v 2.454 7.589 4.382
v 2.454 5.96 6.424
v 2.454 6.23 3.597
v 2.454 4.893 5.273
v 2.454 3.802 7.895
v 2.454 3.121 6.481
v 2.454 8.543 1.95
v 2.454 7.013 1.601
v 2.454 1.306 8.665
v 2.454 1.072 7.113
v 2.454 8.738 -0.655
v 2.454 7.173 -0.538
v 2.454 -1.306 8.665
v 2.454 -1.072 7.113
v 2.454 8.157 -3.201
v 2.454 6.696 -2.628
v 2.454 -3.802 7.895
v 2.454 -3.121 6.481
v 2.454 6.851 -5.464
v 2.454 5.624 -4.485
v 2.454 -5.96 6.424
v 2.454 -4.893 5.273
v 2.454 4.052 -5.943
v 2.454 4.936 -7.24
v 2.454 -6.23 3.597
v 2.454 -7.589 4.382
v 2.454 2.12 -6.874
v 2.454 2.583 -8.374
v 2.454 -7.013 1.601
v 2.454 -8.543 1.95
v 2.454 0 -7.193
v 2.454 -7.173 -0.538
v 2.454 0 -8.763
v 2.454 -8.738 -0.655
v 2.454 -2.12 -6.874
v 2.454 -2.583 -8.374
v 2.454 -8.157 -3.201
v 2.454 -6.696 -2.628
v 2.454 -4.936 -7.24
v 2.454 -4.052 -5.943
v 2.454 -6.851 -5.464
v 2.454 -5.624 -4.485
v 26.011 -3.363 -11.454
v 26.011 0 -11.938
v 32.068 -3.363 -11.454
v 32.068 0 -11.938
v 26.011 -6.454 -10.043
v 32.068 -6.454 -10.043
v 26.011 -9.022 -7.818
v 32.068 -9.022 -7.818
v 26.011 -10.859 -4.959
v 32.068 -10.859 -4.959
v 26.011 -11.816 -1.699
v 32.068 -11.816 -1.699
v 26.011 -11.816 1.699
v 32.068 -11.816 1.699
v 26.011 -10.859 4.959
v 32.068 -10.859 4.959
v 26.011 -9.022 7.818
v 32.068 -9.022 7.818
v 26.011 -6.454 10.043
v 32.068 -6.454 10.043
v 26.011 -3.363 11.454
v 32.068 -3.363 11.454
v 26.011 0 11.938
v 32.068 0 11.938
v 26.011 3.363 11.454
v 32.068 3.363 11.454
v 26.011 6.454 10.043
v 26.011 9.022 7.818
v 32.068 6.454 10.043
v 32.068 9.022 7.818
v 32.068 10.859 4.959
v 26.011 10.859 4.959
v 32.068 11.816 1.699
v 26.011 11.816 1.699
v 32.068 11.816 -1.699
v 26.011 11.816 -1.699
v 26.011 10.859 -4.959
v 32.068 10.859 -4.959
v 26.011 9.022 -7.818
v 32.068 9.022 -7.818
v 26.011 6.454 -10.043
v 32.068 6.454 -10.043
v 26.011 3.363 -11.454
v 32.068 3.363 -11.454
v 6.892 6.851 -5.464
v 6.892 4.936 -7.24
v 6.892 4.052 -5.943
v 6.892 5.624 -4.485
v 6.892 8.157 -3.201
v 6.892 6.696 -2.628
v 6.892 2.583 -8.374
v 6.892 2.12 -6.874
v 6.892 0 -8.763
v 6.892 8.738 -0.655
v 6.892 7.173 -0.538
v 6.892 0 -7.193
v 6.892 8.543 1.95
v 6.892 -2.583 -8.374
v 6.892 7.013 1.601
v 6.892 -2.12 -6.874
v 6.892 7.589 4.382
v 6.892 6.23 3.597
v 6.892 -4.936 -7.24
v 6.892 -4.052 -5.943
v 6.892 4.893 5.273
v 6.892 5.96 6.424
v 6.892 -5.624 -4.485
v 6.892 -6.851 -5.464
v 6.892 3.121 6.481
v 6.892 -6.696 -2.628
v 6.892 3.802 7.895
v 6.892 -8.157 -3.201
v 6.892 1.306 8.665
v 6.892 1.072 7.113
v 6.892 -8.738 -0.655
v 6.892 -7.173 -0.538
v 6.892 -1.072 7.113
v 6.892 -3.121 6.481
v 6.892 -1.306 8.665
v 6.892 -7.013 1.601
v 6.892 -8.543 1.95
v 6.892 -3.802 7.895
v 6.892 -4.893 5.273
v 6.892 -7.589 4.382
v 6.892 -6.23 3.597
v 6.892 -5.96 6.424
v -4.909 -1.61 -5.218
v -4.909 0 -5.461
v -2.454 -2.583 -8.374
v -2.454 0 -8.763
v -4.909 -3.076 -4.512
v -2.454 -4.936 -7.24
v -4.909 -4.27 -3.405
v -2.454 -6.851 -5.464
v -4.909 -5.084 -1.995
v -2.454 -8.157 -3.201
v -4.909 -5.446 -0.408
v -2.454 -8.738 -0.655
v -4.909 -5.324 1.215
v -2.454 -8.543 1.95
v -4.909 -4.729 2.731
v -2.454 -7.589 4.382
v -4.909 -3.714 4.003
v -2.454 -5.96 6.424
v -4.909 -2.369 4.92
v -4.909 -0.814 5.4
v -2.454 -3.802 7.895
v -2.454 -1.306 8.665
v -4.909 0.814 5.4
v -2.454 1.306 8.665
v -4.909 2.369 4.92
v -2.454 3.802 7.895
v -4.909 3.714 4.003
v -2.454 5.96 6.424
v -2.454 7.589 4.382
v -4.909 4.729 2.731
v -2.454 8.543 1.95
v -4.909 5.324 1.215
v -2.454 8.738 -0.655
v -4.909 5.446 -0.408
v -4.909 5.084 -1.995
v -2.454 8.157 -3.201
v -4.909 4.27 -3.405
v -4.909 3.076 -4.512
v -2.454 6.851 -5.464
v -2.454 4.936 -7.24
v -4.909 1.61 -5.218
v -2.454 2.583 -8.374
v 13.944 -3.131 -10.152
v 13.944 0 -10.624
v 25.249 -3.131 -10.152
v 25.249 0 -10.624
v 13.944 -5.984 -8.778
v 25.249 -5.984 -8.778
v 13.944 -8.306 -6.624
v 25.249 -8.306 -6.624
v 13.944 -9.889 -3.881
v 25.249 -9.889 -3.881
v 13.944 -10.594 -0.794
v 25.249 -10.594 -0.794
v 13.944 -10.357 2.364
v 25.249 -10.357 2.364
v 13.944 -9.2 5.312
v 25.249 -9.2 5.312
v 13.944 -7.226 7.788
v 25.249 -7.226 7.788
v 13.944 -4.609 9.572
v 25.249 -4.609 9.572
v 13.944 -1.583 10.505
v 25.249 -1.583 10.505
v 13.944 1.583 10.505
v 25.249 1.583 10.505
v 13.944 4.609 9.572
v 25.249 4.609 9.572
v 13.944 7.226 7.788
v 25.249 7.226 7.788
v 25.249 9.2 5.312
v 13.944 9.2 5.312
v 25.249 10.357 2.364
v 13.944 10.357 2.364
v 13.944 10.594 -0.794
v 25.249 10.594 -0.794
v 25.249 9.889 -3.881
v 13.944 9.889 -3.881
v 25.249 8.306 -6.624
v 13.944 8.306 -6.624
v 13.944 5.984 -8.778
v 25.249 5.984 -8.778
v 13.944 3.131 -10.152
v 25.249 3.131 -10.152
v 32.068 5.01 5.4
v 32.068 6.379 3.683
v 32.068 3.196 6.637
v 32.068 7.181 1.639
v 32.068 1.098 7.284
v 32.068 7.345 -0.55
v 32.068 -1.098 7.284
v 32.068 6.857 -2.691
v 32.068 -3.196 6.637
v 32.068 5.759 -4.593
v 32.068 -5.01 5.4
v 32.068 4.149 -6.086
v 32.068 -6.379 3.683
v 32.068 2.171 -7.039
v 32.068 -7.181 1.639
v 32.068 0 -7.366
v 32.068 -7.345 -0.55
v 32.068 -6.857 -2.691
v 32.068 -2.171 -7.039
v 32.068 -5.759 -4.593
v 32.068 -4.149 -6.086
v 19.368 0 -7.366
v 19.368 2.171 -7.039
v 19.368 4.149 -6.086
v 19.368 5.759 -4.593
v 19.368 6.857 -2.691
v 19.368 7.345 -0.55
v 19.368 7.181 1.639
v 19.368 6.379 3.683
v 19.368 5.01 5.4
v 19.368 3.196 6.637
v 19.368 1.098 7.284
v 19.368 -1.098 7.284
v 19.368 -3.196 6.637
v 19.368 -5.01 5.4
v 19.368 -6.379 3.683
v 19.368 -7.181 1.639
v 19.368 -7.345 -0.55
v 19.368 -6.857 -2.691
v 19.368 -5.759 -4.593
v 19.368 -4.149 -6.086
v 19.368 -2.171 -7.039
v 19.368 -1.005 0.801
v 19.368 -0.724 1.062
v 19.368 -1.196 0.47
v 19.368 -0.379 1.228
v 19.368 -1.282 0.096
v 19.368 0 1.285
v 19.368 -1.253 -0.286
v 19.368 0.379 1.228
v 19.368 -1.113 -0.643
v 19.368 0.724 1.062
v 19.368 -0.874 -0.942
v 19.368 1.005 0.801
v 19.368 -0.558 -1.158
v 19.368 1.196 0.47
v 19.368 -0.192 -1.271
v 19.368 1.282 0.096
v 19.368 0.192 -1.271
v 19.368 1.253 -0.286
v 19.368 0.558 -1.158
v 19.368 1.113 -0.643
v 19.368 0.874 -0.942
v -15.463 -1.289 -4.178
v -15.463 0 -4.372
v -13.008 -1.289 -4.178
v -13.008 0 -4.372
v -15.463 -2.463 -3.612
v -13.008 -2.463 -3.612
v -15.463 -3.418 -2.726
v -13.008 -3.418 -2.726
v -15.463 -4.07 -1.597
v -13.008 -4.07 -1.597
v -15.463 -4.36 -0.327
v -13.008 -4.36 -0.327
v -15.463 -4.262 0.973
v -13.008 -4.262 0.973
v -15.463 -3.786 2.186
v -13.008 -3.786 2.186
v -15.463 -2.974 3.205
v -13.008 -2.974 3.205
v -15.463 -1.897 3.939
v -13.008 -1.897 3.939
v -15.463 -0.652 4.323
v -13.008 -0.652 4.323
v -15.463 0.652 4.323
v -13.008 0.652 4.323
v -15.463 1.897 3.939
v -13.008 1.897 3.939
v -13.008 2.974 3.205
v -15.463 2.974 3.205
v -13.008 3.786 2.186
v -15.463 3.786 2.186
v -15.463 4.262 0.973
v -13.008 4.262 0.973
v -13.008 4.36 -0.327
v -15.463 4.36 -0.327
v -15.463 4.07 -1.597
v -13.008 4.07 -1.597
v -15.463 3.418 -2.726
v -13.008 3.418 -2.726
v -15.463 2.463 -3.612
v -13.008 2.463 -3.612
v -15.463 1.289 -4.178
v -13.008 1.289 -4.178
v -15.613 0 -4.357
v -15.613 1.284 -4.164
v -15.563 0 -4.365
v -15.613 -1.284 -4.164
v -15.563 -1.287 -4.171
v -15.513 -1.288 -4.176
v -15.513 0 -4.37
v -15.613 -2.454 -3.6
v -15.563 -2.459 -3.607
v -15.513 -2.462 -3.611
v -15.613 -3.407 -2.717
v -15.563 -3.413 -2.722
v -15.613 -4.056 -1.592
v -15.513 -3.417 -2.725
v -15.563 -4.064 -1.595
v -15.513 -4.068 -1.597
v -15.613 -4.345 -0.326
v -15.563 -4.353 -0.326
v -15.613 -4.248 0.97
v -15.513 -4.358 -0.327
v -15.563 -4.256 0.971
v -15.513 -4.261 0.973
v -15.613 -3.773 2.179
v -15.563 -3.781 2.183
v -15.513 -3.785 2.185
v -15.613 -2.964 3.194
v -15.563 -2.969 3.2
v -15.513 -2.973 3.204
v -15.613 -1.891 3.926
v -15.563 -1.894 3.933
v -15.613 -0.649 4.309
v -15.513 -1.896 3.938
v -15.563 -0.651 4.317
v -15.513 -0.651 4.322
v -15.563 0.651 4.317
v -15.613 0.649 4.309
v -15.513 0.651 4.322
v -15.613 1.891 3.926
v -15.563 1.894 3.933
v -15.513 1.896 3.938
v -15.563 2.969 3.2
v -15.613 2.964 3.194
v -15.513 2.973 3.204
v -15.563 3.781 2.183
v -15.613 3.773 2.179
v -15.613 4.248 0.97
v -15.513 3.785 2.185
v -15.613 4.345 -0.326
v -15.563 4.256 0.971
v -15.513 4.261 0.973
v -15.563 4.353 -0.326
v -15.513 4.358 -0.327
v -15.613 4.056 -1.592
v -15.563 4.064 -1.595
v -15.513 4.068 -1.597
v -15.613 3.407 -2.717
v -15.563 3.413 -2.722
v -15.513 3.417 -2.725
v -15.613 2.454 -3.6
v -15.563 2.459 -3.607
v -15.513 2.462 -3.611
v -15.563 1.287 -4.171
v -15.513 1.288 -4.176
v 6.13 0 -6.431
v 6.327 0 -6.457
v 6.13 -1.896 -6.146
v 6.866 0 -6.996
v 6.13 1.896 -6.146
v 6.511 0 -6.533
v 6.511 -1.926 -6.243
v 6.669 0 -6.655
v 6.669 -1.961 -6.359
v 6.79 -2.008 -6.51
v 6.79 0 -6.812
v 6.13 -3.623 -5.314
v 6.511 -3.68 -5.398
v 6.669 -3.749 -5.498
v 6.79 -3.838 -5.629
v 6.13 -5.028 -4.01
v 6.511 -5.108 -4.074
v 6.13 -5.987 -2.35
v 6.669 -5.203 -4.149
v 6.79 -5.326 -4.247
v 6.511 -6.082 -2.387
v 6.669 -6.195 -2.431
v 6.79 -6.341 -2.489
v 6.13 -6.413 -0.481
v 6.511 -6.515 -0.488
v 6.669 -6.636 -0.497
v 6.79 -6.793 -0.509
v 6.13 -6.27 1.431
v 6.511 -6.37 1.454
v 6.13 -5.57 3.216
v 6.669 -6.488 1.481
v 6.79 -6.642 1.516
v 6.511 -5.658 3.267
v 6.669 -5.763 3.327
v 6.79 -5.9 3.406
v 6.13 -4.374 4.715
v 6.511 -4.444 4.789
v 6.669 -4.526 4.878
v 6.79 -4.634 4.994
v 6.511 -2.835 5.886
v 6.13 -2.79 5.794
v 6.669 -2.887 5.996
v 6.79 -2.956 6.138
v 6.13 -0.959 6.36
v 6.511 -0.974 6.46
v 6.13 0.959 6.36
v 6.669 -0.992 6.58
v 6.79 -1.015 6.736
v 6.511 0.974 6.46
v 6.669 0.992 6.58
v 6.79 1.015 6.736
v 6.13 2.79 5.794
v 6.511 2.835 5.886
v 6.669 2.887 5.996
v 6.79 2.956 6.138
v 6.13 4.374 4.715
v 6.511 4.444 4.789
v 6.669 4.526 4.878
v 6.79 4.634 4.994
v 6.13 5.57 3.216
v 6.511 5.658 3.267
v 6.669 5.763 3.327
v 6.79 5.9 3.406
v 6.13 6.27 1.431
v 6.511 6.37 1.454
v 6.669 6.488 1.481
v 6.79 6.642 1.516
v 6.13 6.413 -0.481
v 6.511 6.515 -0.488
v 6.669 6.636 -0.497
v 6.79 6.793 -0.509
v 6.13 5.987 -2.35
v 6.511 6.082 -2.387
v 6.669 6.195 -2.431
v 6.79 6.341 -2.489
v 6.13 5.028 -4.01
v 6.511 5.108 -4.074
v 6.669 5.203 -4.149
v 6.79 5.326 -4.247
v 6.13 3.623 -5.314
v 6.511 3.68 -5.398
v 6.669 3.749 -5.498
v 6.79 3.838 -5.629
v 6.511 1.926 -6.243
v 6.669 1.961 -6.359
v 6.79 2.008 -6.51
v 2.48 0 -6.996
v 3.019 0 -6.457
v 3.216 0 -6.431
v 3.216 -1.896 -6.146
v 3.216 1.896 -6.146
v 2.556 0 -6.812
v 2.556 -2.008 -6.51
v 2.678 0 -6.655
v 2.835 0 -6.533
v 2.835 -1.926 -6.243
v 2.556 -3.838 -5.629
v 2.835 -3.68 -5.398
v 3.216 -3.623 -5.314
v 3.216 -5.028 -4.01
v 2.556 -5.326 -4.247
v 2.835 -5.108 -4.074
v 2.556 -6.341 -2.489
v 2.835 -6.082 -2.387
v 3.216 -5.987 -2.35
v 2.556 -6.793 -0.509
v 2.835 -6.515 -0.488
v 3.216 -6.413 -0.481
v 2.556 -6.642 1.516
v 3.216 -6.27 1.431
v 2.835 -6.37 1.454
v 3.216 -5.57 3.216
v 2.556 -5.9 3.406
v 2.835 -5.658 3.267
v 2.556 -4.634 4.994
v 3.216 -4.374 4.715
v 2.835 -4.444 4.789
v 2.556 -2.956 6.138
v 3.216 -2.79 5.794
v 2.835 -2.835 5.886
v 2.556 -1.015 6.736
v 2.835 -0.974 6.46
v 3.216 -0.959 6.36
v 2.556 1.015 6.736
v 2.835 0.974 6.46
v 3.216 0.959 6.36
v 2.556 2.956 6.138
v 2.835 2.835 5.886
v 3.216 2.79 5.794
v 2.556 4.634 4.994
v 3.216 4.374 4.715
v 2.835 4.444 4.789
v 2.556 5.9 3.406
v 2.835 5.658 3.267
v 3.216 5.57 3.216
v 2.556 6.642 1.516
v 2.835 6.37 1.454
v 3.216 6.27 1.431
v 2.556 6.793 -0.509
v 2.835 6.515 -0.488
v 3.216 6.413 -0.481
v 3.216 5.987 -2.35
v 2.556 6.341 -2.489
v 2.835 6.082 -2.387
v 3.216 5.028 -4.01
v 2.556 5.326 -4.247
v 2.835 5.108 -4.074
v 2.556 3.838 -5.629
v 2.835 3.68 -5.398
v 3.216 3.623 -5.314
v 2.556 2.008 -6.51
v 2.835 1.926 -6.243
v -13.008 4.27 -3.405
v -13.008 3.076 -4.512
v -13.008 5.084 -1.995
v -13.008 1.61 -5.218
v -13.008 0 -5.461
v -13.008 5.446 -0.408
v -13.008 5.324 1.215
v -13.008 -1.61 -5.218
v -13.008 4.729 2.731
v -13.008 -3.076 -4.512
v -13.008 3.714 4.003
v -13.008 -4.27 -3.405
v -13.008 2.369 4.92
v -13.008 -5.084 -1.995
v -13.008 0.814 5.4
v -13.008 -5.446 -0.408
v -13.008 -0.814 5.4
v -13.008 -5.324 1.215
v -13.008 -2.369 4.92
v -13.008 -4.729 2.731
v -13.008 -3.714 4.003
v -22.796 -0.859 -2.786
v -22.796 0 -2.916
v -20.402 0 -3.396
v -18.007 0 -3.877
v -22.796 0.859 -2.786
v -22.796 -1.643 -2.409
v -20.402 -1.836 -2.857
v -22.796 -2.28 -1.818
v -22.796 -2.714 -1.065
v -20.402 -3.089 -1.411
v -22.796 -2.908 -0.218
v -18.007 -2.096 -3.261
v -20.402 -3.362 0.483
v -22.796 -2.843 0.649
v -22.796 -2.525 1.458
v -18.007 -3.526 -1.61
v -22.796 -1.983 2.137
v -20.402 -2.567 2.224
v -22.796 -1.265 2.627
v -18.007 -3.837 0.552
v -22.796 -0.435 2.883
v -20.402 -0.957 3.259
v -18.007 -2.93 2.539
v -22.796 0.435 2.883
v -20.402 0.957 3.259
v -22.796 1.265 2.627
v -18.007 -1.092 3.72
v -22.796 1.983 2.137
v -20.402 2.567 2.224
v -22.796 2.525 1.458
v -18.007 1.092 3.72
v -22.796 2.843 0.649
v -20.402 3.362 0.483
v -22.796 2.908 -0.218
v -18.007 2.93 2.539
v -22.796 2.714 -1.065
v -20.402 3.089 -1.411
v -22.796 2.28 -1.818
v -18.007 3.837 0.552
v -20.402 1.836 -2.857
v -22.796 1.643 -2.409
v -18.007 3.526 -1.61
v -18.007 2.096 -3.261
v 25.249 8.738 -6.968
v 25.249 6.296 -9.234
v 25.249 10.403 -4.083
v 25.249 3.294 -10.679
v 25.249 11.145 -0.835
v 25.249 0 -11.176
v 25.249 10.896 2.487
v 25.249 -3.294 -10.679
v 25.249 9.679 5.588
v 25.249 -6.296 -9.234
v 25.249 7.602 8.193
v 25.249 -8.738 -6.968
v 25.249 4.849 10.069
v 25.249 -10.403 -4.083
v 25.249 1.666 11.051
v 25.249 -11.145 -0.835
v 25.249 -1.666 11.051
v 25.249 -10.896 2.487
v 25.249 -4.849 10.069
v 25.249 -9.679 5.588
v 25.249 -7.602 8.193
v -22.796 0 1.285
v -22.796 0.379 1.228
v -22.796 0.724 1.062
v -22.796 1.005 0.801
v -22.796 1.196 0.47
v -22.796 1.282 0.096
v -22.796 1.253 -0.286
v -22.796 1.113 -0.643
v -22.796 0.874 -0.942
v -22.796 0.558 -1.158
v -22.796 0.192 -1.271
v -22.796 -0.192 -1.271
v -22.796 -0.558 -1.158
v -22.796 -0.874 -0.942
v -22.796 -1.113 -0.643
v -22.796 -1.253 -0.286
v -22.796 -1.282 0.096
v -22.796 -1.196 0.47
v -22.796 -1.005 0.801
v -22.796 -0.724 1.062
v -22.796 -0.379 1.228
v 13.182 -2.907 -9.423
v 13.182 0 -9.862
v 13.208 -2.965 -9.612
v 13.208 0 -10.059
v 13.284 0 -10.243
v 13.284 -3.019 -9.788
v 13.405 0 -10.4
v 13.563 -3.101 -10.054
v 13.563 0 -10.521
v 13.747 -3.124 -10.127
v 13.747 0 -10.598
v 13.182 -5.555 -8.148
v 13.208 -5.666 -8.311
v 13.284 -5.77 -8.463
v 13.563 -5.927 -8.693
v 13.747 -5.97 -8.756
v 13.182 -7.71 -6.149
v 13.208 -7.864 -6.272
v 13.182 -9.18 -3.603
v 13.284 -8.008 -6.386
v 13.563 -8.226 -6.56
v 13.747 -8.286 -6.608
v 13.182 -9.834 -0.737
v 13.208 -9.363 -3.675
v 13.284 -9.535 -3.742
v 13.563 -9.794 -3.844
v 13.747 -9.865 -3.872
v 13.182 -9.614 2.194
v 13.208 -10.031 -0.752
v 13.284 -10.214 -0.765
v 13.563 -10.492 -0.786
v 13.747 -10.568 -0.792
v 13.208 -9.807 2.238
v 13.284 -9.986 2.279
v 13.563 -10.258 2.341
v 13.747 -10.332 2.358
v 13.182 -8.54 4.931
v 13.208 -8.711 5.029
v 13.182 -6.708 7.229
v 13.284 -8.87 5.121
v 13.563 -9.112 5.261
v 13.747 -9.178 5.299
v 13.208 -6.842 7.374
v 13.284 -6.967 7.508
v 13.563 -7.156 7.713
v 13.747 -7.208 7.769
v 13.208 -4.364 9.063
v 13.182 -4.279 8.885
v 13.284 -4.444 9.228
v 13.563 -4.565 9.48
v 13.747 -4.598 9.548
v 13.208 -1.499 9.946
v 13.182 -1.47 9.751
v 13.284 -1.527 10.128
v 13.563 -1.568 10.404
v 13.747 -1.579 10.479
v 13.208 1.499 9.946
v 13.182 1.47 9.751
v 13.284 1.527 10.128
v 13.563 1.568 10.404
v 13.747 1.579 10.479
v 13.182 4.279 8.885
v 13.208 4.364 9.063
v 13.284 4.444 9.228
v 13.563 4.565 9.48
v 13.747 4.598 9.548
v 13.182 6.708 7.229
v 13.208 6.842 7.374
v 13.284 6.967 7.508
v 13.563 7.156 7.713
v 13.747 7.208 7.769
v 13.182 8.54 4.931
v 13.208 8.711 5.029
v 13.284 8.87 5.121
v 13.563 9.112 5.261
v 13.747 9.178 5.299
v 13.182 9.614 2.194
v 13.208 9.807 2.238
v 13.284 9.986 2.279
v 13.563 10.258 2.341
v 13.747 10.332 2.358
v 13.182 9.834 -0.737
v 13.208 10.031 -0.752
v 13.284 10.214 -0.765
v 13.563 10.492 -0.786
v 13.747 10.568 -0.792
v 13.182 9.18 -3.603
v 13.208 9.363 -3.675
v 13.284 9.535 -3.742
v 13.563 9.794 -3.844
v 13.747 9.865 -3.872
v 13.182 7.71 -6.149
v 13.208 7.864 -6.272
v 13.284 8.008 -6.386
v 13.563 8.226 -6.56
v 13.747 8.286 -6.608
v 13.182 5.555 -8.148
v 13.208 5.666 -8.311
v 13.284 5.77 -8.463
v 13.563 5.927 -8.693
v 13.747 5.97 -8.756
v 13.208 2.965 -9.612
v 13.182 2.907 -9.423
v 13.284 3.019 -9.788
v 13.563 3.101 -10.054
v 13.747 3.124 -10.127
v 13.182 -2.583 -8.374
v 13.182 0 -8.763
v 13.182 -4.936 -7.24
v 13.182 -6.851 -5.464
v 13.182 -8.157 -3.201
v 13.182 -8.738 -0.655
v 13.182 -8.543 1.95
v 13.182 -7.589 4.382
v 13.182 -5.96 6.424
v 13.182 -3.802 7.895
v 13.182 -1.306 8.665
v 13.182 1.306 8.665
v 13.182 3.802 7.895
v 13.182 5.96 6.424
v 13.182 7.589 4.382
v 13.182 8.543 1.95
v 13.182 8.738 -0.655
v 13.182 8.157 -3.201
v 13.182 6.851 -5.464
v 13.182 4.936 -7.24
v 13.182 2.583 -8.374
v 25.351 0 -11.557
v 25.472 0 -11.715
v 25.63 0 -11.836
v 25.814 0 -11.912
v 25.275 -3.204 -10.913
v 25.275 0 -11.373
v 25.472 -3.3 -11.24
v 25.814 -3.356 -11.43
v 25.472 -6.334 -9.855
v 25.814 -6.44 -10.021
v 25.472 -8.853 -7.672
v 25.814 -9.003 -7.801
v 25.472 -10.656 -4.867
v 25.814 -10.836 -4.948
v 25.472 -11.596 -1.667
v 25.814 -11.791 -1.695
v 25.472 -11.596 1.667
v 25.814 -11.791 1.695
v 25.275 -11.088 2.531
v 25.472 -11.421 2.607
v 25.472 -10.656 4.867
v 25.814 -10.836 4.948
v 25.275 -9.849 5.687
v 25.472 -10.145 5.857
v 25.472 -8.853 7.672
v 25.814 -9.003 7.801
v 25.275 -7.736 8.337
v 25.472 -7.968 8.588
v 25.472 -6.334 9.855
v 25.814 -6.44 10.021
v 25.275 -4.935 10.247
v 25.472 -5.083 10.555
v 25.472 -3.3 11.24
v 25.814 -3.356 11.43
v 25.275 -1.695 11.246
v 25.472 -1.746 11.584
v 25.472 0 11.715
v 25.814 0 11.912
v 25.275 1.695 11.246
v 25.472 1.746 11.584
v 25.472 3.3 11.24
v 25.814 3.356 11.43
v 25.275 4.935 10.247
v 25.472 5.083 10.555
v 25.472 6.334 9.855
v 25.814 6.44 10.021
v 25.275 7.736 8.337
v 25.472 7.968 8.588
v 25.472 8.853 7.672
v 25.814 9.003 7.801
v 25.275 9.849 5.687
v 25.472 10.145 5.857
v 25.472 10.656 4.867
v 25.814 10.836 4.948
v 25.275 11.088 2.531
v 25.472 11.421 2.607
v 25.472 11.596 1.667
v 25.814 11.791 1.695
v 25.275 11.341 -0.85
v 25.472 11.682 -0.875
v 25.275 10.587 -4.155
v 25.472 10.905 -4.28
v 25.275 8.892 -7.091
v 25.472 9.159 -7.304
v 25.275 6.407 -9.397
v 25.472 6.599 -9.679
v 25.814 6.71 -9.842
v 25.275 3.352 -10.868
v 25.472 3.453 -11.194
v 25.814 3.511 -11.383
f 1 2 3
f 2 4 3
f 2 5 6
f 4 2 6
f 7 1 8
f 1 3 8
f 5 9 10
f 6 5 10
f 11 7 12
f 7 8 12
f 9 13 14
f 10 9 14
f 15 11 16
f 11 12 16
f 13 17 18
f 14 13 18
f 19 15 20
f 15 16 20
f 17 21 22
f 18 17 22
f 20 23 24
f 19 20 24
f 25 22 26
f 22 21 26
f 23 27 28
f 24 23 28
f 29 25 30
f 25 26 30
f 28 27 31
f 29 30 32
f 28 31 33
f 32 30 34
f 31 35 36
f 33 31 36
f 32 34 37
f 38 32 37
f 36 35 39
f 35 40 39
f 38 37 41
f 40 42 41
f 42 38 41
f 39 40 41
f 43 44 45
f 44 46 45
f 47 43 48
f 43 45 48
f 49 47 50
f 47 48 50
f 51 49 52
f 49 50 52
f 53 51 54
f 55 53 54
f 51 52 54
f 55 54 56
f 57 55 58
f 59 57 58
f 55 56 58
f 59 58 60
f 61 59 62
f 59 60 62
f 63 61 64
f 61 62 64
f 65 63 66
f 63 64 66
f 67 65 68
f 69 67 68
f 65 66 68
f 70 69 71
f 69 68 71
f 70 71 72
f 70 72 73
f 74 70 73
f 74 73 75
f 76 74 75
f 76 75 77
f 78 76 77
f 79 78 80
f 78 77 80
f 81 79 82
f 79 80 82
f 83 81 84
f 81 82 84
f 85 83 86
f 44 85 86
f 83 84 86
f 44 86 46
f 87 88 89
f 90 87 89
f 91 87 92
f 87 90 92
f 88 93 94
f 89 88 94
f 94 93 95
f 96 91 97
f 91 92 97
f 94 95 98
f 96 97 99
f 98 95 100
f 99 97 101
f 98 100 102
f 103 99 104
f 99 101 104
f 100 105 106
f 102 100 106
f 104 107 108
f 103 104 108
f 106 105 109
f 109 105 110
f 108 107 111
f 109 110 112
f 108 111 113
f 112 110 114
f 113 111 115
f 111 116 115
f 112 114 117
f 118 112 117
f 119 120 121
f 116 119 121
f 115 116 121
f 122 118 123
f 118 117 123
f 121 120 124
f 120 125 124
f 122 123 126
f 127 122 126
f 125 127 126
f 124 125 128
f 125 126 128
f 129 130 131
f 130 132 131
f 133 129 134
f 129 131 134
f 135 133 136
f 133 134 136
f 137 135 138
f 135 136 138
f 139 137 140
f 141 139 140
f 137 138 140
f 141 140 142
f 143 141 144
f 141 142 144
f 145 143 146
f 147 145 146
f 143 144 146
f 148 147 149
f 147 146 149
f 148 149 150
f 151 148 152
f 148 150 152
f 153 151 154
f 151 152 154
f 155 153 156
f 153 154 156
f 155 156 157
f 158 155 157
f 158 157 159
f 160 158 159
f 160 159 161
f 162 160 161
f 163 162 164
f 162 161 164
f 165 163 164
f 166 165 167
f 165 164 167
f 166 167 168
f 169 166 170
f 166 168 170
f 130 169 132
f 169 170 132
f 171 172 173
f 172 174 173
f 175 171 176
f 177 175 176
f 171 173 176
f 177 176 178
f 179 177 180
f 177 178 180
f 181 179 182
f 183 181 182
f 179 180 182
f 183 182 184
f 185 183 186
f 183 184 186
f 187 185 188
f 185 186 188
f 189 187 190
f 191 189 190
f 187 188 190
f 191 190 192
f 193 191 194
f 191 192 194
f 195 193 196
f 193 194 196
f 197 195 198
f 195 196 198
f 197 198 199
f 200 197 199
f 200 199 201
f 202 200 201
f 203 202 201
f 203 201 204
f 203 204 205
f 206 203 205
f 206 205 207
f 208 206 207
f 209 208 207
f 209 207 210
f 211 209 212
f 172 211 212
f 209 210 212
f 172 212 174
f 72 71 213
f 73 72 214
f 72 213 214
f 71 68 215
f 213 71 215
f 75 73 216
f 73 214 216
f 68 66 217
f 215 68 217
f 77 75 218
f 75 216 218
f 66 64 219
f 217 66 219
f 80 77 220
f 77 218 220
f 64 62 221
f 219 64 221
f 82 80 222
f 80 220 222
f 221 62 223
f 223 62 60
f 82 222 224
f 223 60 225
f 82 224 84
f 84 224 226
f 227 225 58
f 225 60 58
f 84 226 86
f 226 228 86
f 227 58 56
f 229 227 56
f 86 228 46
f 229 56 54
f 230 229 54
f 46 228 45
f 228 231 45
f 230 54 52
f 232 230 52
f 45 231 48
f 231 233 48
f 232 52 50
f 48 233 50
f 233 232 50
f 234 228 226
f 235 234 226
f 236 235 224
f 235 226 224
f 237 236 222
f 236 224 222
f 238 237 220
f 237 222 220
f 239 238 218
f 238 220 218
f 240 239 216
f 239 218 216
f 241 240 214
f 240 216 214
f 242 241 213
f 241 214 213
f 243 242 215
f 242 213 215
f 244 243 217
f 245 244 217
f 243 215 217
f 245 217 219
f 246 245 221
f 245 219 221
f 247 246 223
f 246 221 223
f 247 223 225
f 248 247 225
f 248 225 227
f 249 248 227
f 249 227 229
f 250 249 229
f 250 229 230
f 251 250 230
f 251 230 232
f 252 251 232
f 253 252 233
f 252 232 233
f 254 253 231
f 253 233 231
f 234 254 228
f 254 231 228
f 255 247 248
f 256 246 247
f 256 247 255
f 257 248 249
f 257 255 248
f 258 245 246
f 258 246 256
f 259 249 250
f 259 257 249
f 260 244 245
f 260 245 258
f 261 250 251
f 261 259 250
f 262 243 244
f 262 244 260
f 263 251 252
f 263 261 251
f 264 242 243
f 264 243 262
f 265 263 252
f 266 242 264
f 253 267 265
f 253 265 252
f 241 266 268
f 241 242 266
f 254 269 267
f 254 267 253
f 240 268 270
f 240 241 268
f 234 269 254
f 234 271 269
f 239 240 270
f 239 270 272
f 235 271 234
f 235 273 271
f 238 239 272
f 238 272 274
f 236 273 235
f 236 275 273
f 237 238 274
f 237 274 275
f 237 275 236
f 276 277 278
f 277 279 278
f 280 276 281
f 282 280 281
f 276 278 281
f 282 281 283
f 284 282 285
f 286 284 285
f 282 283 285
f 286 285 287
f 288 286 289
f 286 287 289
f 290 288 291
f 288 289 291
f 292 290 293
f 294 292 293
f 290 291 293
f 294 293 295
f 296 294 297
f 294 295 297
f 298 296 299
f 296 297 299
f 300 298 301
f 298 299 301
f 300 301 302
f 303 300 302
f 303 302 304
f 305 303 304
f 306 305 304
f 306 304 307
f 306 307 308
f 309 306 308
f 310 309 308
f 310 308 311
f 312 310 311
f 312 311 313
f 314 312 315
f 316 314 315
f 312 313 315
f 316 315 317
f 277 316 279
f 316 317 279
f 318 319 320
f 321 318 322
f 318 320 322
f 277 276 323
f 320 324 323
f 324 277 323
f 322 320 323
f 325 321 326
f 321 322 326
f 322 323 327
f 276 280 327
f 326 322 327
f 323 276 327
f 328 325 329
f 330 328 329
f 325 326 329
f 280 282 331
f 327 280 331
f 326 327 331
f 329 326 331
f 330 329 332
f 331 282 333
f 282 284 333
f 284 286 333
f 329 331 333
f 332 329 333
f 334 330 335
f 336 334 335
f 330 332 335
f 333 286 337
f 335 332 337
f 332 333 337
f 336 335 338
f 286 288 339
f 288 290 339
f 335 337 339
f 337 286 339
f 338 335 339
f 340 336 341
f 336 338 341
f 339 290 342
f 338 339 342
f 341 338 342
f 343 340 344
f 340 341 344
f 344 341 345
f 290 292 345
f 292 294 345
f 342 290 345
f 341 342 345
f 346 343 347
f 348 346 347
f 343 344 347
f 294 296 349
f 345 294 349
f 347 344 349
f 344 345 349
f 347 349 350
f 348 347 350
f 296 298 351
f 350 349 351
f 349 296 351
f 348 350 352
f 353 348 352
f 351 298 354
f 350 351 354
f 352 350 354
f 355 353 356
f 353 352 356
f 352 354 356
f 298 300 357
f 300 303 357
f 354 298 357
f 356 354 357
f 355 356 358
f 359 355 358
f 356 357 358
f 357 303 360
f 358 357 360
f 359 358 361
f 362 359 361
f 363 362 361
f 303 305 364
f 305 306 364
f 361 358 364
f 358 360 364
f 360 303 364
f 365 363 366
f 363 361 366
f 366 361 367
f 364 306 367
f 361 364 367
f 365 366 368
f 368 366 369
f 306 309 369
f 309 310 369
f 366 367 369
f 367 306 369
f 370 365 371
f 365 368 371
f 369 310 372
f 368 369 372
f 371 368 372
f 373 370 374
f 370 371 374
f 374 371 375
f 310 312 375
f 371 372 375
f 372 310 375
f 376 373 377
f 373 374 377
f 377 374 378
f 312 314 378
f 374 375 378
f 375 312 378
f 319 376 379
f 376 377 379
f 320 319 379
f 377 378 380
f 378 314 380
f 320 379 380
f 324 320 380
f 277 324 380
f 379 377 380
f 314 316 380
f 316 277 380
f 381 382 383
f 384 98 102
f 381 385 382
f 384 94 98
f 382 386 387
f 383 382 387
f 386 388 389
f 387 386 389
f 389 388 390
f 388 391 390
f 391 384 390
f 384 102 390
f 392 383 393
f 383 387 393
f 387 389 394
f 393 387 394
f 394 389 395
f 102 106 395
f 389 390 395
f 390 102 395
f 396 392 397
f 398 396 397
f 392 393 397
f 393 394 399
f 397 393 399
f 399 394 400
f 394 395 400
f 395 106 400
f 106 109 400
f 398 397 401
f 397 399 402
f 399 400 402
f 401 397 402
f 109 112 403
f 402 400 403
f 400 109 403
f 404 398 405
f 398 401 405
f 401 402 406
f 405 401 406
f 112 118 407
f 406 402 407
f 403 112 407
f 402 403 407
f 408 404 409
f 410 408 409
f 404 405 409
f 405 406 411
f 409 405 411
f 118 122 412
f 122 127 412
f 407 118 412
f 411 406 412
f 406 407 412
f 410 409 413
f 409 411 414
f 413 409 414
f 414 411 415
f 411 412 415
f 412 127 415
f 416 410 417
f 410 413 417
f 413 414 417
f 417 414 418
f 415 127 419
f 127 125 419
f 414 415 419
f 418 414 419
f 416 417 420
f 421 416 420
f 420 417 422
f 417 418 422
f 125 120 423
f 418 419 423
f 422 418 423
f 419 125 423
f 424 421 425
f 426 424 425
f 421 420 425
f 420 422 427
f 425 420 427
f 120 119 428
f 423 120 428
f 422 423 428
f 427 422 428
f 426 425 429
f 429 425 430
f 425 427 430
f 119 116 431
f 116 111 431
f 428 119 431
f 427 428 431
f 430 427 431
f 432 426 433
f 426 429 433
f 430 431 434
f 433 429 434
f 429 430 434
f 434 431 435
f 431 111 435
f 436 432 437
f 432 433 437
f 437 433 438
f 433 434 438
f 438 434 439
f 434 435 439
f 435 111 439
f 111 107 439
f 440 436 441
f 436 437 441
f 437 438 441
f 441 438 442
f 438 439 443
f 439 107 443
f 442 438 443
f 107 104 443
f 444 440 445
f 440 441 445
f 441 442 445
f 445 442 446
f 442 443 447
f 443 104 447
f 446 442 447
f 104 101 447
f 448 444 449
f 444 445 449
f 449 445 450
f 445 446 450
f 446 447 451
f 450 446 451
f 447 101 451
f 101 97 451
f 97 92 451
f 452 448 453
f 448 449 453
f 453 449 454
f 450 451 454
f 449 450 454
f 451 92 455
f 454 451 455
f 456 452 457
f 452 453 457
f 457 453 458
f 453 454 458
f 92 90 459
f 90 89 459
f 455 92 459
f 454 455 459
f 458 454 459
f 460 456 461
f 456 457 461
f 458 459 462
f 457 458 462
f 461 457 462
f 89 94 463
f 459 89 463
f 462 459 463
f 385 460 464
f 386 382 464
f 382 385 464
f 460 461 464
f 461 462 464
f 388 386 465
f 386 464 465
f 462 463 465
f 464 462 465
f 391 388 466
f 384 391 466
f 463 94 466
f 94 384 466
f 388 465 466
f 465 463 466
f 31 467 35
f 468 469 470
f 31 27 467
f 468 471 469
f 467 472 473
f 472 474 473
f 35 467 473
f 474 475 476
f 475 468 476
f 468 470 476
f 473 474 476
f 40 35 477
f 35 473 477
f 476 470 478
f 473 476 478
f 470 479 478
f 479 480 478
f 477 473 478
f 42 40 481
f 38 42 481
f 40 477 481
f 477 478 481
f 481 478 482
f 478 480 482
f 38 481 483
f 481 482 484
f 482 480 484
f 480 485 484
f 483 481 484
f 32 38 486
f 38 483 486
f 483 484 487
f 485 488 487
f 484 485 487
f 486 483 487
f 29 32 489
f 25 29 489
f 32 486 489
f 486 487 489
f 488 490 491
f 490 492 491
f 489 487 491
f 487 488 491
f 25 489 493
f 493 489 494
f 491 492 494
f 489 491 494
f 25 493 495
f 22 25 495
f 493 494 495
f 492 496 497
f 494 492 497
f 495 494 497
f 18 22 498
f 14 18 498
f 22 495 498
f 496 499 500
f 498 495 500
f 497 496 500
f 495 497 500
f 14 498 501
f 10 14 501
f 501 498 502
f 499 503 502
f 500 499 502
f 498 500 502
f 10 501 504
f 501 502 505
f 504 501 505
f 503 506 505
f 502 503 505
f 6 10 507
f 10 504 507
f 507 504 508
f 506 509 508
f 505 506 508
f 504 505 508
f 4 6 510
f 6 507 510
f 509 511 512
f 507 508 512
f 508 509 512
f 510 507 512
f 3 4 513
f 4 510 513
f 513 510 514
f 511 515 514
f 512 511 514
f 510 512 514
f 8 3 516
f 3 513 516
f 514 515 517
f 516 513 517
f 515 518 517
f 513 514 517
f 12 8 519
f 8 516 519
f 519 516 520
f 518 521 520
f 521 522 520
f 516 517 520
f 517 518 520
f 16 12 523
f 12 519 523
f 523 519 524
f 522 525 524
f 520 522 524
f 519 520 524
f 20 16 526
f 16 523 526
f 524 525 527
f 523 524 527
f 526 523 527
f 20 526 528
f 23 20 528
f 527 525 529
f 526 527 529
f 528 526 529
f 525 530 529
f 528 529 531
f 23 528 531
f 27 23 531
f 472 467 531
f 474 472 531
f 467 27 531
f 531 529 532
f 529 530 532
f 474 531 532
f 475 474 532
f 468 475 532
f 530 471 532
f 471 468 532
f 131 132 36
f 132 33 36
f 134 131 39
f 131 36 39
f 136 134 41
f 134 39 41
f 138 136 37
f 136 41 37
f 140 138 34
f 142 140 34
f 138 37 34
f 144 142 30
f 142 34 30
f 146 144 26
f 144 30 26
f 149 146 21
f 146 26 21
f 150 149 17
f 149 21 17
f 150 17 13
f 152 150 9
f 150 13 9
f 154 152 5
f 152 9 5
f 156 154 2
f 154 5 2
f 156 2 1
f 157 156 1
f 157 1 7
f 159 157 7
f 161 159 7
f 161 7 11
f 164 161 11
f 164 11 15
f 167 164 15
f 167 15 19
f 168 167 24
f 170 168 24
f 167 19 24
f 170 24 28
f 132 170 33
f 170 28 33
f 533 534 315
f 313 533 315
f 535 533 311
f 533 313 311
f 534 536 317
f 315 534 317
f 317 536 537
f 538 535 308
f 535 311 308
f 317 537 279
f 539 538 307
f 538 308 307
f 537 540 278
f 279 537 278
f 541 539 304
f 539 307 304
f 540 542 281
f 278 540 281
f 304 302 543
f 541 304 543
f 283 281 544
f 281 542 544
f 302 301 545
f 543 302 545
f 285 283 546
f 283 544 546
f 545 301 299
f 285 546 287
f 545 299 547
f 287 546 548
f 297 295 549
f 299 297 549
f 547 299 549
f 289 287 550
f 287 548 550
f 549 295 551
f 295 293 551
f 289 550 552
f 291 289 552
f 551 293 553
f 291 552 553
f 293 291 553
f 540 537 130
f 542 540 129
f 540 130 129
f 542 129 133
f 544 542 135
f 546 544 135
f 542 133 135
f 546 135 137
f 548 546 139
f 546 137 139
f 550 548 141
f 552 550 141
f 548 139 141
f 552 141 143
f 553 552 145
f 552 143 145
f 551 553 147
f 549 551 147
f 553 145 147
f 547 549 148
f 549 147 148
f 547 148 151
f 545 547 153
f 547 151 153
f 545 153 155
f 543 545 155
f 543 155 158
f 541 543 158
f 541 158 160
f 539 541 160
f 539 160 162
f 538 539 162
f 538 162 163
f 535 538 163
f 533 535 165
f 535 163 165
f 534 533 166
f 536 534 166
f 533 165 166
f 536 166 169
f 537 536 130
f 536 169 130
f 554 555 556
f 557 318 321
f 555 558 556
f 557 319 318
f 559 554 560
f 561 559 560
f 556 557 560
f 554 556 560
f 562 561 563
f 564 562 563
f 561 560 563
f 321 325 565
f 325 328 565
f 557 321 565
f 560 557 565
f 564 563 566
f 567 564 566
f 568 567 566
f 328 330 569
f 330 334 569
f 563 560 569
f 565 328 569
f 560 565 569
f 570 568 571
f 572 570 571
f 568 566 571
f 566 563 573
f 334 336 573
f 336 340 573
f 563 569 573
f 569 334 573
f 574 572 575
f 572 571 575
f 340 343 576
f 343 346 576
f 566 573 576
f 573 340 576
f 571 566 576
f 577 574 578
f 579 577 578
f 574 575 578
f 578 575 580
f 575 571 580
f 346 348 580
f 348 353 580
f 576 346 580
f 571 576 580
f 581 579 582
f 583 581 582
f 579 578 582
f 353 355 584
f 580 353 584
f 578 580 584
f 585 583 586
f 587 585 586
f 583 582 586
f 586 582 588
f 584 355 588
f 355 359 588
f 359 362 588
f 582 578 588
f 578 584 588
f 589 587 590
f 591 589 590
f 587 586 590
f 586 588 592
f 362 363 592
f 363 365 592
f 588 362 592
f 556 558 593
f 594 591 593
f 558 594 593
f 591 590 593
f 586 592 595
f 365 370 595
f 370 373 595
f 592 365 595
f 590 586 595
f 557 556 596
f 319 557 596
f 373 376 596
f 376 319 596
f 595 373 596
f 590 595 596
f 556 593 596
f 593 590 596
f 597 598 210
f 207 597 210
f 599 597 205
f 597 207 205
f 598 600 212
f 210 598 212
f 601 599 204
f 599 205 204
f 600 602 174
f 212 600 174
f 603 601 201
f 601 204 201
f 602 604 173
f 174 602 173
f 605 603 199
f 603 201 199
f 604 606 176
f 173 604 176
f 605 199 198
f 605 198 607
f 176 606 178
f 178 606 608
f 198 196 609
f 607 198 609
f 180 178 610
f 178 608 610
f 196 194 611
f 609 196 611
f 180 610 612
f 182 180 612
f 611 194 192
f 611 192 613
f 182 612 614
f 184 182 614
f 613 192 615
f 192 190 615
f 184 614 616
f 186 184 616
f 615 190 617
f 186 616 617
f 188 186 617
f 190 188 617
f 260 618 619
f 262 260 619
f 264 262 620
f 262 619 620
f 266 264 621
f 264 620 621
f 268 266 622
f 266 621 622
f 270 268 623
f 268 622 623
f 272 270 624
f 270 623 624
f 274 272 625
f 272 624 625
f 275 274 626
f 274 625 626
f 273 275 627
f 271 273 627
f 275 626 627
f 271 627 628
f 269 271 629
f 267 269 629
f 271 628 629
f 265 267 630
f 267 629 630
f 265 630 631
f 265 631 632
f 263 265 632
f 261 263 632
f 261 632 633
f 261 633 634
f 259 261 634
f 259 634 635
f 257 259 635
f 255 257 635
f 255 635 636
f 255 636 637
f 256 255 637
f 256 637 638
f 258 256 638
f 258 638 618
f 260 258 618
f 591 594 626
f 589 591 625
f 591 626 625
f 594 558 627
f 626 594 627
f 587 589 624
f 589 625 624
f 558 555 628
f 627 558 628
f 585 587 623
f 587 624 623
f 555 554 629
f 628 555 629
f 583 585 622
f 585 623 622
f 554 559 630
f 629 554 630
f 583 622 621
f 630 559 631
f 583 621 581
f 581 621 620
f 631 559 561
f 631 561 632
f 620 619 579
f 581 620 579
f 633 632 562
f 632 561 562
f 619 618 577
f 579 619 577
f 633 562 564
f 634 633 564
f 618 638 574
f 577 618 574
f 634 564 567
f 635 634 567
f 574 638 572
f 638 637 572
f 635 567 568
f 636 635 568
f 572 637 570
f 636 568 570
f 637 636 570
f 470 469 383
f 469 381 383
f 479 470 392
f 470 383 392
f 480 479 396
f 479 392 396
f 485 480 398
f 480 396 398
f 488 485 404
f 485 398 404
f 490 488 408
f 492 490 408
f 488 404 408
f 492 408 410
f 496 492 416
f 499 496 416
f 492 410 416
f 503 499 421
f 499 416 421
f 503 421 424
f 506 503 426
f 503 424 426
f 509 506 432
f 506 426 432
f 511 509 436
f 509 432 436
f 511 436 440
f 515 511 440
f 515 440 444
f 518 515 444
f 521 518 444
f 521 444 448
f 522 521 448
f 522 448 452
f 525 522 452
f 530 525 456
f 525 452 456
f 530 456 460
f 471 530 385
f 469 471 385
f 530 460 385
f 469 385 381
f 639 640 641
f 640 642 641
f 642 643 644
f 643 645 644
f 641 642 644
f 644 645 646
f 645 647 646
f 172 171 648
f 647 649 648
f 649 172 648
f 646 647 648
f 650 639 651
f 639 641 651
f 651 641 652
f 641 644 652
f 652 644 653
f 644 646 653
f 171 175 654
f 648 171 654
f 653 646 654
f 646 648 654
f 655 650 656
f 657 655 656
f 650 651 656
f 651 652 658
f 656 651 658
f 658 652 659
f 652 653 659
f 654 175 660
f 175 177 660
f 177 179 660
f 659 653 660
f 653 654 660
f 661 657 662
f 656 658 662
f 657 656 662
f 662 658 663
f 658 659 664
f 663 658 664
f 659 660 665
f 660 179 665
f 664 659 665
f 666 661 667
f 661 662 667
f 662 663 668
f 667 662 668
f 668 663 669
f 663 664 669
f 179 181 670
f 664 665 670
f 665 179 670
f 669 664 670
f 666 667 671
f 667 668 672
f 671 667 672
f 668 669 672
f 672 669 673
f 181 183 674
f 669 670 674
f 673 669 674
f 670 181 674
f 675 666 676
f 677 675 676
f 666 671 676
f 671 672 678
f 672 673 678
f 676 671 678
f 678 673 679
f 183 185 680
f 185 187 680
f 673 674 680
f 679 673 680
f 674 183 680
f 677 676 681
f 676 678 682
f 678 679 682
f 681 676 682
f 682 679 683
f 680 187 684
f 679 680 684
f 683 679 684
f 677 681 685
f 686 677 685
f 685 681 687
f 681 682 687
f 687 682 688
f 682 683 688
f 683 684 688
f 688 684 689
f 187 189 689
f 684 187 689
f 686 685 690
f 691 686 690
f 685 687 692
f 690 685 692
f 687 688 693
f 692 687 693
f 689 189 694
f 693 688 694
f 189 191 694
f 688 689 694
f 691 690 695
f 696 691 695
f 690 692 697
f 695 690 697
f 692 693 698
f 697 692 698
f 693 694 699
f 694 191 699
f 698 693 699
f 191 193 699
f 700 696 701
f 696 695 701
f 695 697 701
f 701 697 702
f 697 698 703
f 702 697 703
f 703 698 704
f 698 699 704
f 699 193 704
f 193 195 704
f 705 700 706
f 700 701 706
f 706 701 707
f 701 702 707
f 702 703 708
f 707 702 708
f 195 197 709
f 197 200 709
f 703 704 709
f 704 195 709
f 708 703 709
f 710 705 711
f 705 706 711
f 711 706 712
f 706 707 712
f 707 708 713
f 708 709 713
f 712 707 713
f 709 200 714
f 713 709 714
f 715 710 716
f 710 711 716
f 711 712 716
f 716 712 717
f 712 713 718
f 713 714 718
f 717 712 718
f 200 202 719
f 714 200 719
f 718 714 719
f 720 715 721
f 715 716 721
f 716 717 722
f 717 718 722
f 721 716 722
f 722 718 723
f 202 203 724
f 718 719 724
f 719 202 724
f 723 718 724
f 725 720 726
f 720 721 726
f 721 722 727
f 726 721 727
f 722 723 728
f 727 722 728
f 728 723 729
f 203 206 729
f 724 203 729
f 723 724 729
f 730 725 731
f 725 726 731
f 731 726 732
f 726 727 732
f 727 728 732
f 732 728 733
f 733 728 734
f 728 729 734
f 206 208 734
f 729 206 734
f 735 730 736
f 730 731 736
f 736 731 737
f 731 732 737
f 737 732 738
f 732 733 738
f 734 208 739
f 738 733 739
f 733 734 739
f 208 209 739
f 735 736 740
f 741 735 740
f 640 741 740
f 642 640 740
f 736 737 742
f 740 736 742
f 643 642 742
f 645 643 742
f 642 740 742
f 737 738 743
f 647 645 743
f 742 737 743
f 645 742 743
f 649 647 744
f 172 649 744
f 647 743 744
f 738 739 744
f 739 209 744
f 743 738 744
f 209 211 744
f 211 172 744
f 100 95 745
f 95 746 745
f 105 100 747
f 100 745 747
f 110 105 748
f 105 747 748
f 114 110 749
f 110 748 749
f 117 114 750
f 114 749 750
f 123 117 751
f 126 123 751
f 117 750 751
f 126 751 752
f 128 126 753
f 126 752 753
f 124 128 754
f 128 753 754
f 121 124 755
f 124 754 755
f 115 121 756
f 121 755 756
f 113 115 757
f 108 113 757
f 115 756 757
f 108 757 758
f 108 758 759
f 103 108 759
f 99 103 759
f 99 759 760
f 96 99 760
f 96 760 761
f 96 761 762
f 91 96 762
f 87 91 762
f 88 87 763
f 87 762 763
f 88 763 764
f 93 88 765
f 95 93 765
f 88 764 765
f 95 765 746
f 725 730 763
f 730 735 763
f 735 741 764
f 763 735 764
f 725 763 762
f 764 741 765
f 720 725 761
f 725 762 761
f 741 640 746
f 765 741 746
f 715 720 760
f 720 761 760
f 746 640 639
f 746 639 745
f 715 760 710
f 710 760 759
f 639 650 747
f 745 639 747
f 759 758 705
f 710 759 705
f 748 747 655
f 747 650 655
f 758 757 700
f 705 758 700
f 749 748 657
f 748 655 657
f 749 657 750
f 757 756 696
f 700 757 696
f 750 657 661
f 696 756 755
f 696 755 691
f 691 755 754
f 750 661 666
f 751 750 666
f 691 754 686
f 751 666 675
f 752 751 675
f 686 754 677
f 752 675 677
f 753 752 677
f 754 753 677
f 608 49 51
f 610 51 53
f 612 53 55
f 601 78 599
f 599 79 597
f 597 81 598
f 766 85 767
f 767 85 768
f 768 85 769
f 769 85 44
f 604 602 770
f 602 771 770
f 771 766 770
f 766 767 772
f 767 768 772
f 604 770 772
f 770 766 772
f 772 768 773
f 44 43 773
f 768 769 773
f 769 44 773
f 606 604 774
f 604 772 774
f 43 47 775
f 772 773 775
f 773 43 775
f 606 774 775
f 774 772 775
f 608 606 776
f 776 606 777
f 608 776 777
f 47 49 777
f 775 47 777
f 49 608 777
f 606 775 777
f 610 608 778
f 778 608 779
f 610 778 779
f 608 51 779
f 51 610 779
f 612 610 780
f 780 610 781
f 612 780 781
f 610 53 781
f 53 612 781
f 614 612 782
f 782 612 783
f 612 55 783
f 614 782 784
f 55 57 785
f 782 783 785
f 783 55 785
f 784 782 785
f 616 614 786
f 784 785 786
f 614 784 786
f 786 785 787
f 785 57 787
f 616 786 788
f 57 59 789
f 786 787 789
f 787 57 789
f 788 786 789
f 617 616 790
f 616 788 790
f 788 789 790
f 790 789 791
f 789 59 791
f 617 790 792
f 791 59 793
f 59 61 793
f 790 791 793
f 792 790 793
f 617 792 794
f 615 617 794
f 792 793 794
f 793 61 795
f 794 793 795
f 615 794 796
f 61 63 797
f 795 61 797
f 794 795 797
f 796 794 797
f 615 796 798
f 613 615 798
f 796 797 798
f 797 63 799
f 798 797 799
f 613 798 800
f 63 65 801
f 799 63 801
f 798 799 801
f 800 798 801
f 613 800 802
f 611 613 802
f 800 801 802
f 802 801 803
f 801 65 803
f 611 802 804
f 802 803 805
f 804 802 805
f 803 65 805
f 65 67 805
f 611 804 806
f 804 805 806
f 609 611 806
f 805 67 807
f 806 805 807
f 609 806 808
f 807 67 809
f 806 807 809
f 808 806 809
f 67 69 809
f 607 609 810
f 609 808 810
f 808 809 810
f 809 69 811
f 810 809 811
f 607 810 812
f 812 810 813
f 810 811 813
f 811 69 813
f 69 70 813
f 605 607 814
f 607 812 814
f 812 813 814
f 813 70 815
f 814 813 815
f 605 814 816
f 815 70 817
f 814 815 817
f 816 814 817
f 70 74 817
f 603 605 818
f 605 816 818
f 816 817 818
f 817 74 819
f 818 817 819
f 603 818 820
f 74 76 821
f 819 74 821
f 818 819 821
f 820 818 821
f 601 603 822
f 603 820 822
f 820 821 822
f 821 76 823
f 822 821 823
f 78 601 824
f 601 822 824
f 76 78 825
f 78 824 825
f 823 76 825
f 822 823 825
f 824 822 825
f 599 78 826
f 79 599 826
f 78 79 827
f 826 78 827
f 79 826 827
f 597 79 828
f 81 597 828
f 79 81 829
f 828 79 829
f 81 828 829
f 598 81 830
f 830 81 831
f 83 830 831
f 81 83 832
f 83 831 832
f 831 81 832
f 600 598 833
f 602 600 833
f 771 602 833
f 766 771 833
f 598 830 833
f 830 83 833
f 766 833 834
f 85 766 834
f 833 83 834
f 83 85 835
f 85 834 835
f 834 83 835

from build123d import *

# Parameters (mm, degrees)
SKETCH4_R          = 7.366
CUT_EXTRUDE1_DEPTH = 12.7
SKETCH5_R          = 1.285315945
CUT_EXTRUDE2_DEPTH = 58.402876137


with BuildPart() as part:
    # Sketch3 → Revolve1 (revolve)
    with BuildSketch(Plane(origin=(0, 0, 0), x_dir=(1, 0, 0), z_dir=(0, 1, 0))):
        with BuildLine():
            Line((-13.008224719, 5.461), (-4.908764045, 5.461))
            Line((-4.908764045, 5.461), (-2.454382022, 8.763))
            Line((-2.454382022, 8.763), (2.454382022, 8.763))
            Line((2.454382022, 8.763), (2.454382022, 7.193337079))
            ThreePointArc((2.454382022, 7.193337079), (2.677566655, 6.654521711), (3.216382022, 6.431337079))
            Line((3.216382022, 6.431337079), (6.129904719, 6.431337079))
            ThreePointArc((6.129904719, 6.431337079), (6.668720086, 6.654521711), (6.891904719, 7.193337079))
            Line((6.891904719, 7.193337079), (6.891904719, 8.763))
            Line((6.891904719, 8.763), (13.18230172, 8.763))
            Line((13.18230172, 8.763), (13.18230172, 9.861582968))
            ThreePointArc((13.18230172, 9.861582968), (13.405486353, 10.400398335), (13.94430172, 10.623582968))
            Line((13.94430172, 10.623582968), (25.249181883, 10.623582968))
            Line((25.249181883, 10.623582968), (25.249181883, 11.176))
            ThreePointArc((25.249181883, 11.176), (25.472366516, 11.714815367), (26.011181883, 11.938))
            Line((26.011181883, 11.938), (32.067699775, 11.938))
            Line((32.067699775, 11.938), (32.067699775, 0))
            Line((32.067699775, 0), (-13.008224719, 0))
            Line((-13.008224719, 0), (-22.796300225, 0))
            Line((-22.796300225, 0), (-22.796300225, 2.915805843))
            Line((-22.796300225, 2.915805843), (-15.612883129, 4.357169766))
            ThreePointArc((-15.612883129, 4.357169766), (-15.538297762, 4.368329091), (-15.462974592, 4.372061052))
            Line((-15.462974592, 4.372061052), (-13.008224719, 4.372061052))
            Line((-13.008224719, 4.372061052), (-13.008224719, 5.461))
        make_face()
    revolve(axis=Axis((32.067699775, 0, 0), (-1, 0, 0)))

    # Sketch4 → Cut-Extrude1 (cut)
    with BuildSketch(Plane(origin=(32.067699775, 0, 0), x_dir=(0, 0, -1), z_dir=(1, 0, 0))):
        Circle(SKETCH4_R)
    extrude(amount=-CUT_EXTRUDE1_DEPTH, mode=Mode.SUBTRACT)

    # Sketch5 → Cut-Extrude2 (cut, through all)
    with BuildSketch(Plane.ZY.offset(22.796300225)):
        Circle(SKETCH5_R)
    extrude(amount=-CUT_EXTRUDE2_DEPTH, mode=Mode.SUBTRACT)


solid = part.part
